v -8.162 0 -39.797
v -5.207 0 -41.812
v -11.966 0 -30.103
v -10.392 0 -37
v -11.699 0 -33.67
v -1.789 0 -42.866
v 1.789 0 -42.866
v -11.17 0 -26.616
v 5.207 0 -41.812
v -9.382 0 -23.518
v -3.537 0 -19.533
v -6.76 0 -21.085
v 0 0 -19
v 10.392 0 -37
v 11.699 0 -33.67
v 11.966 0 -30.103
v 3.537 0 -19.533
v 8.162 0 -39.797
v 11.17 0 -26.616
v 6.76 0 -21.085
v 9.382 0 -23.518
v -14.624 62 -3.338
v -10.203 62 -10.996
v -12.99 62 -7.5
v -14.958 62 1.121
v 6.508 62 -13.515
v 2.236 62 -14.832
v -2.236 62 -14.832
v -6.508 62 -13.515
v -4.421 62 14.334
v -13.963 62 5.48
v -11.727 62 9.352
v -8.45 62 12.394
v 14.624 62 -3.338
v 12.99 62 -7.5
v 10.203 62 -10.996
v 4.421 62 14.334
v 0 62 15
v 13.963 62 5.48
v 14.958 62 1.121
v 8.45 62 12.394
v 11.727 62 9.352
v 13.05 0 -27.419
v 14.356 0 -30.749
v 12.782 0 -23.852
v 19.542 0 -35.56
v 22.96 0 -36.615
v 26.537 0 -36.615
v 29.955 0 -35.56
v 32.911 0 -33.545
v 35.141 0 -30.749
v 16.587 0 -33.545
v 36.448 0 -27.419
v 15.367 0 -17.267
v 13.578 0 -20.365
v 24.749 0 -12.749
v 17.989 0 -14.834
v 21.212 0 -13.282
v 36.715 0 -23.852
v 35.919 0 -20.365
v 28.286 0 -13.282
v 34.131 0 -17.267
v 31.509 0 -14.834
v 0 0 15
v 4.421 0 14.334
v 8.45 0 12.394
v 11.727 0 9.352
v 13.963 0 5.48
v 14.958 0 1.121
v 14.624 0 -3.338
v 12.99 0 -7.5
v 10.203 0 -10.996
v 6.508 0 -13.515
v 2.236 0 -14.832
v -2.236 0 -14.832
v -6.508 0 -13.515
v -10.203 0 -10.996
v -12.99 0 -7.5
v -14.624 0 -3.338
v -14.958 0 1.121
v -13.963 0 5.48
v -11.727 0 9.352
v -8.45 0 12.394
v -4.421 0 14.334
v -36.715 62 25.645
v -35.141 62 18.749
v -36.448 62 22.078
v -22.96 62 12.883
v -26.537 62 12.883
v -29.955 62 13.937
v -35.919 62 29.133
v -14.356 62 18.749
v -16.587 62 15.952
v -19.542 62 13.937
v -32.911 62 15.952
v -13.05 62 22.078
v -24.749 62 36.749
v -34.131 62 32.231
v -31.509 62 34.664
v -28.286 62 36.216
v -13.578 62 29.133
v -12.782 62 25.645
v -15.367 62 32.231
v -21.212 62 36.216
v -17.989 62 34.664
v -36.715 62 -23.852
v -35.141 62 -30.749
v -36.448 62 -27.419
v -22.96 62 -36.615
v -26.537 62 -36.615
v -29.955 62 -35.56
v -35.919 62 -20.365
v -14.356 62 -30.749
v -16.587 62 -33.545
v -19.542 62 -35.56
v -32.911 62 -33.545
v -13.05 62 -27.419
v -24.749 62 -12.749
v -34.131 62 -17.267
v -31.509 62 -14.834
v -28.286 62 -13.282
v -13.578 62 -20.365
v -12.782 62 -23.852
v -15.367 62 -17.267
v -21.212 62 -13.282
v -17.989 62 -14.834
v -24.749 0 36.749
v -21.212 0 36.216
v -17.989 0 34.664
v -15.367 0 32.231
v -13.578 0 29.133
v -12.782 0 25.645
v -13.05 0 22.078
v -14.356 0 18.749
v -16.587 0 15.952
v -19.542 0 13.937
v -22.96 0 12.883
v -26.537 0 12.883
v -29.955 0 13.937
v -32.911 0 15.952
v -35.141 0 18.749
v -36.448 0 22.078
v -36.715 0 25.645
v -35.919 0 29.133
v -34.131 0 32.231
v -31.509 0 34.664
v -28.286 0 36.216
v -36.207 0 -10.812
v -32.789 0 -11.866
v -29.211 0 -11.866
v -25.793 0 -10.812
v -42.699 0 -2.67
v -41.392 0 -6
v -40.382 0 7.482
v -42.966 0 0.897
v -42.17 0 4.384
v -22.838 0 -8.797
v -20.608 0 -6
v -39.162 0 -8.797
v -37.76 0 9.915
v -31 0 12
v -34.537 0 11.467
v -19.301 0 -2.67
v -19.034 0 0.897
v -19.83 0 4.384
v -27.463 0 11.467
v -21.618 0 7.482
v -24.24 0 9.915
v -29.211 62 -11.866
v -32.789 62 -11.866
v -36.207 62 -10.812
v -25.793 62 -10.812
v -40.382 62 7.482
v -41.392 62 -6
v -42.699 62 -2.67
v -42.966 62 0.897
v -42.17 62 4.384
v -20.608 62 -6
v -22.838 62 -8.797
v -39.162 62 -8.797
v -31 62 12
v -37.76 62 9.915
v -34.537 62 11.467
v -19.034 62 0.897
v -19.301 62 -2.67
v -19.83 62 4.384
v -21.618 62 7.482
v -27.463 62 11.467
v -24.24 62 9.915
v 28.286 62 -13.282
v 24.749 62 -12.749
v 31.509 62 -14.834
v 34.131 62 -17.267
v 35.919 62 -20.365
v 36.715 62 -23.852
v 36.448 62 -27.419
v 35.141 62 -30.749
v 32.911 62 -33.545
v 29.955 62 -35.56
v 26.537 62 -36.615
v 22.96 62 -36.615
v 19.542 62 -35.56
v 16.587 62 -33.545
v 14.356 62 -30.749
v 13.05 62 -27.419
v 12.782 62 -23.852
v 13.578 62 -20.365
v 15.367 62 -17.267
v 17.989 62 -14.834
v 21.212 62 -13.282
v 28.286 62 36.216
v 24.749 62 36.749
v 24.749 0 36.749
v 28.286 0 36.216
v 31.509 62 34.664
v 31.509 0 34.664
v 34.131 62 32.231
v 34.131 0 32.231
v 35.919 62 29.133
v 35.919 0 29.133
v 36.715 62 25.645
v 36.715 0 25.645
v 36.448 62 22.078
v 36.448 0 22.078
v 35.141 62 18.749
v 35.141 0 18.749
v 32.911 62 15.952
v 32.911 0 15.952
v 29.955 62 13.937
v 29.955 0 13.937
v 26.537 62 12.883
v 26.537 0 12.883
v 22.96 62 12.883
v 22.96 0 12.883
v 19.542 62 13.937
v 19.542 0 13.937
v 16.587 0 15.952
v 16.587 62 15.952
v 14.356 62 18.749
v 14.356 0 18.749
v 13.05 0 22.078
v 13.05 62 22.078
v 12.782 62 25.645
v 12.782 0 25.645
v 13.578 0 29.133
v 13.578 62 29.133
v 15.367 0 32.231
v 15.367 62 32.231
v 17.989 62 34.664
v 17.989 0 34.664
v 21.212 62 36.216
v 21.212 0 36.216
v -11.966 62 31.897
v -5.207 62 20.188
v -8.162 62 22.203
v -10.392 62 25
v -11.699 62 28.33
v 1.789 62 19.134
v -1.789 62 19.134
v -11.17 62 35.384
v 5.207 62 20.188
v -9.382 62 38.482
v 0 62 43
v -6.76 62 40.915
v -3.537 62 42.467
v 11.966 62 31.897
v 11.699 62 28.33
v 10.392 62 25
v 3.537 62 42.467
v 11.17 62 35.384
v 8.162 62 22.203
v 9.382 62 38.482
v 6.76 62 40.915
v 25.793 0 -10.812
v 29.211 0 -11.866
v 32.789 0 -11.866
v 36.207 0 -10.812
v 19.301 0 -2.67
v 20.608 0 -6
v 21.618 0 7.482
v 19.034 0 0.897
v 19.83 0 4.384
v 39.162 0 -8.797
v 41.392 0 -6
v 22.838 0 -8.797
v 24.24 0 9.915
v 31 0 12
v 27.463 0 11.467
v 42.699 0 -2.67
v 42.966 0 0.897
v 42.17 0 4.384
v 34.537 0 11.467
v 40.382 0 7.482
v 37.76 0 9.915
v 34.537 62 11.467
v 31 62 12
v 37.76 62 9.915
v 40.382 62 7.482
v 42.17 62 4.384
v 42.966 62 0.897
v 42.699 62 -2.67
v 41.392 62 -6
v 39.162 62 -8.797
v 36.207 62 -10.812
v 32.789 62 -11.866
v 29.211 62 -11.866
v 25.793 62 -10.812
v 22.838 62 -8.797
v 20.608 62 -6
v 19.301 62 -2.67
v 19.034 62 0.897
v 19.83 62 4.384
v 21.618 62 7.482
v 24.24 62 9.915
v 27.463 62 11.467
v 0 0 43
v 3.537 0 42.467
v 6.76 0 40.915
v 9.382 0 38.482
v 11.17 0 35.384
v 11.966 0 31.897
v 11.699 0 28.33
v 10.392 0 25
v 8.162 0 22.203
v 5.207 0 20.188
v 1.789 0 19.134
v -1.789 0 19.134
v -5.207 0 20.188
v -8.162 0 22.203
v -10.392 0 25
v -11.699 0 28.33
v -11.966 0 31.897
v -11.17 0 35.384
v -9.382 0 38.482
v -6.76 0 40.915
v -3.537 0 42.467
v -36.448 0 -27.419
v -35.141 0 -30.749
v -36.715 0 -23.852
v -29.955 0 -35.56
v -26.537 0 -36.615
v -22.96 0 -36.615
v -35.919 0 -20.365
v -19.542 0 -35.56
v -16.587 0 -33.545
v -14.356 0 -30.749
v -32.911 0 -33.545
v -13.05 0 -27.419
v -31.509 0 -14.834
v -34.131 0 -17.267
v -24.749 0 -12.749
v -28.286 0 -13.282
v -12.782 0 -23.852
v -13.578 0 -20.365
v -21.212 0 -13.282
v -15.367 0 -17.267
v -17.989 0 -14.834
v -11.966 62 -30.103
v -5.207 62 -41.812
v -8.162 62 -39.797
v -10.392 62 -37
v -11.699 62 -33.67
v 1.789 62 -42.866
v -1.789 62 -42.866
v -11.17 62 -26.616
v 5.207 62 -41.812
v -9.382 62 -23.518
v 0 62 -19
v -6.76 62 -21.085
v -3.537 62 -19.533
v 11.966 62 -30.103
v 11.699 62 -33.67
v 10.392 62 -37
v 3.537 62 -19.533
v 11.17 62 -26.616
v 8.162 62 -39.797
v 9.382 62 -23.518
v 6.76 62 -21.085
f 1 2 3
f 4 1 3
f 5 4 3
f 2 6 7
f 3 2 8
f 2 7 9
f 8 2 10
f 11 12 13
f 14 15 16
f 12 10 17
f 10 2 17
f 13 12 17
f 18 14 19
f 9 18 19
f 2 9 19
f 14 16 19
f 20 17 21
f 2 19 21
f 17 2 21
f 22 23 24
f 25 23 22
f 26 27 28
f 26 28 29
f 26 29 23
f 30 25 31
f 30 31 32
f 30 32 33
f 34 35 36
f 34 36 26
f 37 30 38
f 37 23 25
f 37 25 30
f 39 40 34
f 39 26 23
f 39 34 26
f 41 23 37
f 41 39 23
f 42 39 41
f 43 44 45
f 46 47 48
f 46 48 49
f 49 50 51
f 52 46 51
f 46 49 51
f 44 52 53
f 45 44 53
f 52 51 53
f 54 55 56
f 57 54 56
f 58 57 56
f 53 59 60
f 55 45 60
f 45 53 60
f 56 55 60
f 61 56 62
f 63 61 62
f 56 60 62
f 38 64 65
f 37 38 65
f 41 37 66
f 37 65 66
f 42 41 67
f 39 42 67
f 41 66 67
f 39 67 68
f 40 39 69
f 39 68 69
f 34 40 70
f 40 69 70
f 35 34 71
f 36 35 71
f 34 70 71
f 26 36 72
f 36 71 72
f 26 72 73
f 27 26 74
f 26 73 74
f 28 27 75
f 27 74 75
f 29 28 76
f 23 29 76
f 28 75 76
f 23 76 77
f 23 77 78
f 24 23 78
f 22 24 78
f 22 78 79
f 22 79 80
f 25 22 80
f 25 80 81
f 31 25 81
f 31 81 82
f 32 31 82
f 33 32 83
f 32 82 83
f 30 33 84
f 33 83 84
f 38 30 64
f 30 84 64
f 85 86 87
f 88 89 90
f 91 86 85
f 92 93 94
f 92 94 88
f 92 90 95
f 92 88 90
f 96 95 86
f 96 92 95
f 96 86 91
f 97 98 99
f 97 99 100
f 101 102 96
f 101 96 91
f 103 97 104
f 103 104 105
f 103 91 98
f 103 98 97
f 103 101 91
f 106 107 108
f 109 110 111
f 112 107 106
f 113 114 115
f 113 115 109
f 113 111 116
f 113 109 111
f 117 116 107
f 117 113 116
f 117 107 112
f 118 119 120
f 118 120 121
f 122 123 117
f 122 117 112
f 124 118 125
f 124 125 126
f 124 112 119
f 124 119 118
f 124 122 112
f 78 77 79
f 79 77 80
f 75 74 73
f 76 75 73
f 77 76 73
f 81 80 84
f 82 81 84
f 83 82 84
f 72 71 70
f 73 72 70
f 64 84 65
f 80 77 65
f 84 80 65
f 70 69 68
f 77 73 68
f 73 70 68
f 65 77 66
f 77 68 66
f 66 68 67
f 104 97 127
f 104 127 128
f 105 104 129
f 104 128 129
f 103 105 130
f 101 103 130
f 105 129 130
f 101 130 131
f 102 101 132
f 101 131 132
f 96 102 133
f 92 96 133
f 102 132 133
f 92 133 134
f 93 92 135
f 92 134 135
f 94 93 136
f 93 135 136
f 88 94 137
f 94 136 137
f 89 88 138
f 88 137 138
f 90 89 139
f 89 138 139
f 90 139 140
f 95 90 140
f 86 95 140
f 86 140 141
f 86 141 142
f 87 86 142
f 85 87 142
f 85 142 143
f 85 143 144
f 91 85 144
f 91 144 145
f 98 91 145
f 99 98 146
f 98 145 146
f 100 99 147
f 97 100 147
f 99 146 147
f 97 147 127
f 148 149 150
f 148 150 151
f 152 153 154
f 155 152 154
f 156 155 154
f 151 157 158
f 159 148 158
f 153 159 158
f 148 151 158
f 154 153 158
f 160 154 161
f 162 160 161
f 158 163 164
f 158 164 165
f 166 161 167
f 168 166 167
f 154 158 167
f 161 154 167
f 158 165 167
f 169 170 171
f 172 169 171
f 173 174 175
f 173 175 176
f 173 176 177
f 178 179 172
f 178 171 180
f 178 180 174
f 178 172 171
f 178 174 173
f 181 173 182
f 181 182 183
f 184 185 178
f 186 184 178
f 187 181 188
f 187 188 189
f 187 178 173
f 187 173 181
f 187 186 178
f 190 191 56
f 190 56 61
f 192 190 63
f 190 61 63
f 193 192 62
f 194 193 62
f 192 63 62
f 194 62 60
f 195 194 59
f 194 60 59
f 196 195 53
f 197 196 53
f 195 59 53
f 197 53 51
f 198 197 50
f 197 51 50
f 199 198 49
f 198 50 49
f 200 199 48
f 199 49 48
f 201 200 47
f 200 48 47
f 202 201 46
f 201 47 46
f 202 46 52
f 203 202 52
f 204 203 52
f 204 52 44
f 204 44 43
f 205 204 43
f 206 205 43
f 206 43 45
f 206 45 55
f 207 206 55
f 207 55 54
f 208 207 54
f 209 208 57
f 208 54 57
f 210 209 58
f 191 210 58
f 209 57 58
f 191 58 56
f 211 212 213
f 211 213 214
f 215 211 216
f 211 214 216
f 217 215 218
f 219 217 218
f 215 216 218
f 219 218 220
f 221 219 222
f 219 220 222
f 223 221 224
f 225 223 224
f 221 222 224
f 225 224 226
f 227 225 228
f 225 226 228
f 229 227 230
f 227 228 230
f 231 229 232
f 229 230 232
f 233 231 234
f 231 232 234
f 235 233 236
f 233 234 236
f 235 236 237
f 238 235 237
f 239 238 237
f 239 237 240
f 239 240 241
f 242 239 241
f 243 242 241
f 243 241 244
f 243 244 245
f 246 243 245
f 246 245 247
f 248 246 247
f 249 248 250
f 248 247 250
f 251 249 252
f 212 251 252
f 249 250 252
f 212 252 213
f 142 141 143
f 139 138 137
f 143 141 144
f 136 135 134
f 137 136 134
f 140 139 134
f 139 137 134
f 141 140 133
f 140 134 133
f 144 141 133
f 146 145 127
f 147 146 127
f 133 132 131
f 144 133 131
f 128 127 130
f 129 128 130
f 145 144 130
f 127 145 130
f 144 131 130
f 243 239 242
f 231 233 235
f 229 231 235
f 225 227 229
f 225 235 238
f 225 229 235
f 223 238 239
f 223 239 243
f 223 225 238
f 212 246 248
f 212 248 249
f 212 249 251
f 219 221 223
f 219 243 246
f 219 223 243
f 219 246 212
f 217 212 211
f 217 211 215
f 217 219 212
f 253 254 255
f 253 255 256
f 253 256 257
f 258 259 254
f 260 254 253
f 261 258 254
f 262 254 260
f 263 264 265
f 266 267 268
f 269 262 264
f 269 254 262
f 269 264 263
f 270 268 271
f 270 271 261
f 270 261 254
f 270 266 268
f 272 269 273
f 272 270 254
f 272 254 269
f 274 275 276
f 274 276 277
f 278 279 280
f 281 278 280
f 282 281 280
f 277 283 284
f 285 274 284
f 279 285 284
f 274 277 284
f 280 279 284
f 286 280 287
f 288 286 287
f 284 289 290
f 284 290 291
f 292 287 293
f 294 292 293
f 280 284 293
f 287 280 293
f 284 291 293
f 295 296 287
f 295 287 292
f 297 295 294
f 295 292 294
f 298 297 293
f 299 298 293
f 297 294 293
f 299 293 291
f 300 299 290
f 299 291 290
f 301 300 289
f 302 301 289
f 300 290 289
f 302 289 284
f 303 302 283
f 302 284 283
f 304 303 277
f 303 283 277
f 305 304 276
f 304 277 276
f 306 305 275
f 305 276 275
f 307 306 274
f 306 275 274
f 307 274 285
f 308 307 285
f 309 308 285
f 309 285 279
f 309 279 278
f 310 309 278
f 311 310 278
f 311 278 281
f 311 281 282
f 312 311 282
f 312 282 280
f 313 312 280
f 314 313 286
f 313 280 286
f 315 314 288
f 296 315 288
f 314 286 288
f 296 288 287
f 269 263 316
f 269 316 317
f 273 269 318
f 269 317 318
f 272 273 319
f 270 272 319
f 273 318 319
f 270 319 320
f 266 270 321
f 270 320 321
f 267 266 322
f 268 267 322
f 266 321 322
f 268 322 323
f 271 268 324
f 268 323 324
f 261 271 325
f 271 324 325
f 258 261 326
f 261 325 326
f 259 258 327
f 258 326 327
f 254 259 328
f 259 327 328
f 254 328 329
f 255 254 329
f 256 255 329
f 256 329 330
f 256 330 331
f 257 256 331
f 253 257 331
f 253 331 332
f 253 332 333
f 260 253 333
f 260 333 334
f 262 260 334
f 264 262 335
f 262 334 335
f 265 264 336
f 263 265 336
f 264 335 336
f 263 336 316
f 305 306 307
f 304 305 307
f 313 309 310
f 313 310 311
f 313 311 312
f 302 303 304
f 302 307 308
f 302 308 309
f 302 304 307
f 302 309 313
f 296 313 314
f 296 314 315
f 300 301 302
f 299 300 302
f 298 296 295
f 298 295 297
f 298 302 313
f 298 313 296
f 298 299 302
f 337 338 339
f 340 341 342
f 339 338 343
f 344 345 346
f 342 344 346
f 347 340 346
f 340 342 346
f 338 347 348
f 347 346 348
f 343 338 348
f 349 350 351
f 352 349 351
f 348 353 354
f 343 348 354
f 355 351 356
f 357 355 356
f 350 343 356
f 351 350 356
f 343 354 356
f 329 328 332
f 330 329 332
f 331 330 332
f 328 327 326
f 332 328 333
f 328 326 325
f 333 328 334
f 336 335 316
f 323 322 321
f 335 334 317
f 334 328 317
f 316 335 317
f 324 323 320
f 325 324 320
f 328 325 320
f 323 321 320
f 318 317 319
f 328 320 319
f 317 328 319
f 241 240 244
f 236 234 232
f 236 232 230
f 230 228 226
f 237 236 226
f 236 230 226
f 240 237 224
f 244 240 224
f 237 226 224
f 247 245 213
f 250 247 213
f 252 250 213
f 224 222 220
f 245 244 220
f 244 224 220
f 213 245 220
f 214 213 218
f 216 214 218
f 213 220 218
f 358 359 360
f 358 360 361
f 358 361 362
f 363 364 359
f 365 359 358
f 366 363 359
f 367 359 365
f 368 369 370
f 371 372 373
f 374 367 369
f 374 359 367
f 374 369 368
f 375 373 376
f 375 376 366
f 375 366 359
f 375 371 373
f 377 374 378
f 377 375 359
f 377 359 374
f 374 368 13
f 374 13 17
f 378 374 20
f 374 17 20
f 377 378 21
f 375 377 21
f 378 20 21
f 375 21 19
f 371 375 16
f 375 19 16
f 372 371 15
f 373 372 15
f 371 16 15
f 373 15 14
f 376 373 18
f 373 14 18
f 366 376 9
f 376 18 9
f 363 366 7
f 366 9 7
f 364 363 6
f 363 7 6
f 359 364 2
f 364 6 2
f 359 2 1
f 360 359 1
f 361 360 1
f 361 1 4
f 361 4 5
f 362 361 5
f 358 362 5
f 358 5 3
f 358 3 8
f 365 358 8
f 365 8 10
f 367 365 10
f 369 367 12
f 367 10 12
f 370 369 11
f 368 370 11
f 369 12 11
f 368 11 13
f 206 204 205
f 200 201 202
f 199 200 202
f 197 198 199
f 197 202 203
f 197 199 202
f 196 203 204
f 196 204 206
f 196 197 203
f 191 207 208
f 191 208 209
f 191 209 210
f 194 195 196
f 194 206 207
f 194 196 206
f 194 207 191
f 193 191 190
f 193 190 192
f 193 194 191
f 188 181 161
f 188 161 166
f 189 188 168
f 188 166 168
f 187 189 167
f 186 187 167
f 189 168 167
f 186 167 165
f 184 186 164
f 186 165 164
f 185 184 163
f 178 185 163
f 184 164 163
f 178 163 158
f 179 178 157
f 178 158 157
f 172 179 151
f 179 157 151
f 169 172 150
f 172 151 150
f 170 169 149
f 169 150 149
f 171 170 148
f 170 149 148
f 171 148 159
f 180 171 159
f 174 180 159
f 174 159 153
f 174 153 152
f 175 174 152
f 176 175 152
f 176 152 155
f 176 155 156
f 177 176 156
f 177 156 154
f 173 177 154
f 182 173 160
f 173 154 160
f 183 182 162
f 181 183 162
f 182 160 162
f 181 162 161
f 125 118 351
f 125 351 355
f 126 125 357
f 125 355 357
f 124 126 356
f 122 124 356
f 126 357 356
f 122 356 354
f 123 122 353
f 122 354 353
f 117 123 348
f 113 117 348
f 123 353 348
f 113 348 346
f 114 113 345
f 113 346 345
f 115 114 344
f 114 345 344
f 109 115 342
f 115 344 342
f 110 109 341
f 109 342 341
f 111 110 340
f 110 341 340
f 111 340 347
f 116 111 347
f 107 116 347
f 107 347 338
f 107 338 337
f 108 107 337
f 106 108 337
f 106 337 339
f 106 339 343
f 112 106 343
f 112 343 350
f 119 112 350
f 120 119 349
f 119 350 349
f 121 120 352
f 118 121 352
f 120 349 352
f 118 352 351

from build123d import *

# Parameters (mm, degrees)
SKETCH_2_R        = 15
EXTRUDE_2_DEPTH   = 62
SKETCH_2_R_2      = 12
EXTRUDE_2_2_DEPTH = 62
EXTRUDE_2_3_DEPTH = 62
EXTRUDE_2_4_DEPTH = 62
EXTRUDE_2_5_DEPTH = 62
EXTRUDE_2_6_DEPTH = 62
EXTRUDE_2_7_DEPTH = 62
EXTRUDE_2_8_DEPTH = 62
EXTRUDE_2_9_DEPTH = 62


with BuildPart() as part:
    # 草图2 → 凸台-拉伸2 (new body)
    with BuildSketch(Plane(origin=(0, 0, 0), x_dir=(1, 0, 0), z_dir=(0, 1, 0))):
        with Locations(Location((0, 0, 0), (0, 0, 270))):
            Circle(SKETCH_2_R)
    extrude(amount=EXTRUDE_2_DEPTH)


with BuildPart() as body_2:
    # 草图2 → Extrude 2 2 (new body)
    with BuildSketch(Plane(origin=(0, 0, 0), x_dir=(1, 0, 0), z_dir=(0, 1, 0))):
        with Locations(Location((31, 0, 0), (0, 0, 270))):
            Circle(SKETCH_2_R_2)
    extrude(amount=EXTRUDE_2_2_DEPTH)


with BuildPart() as body_3:
    # 草图2 → Extrude 2 3 (new body)
    with BuildSketch(Plane(origin=(0, 0, 0), x_dir=(1, 0, 0), z_dir=(0, 1, 0))):
        with Locations(Location((0, -31, 0), (0, 0, 270))):
            Circle(SKETCH_2_R_2)
    extrude(amount=EXTRUDE_2_3_DEPTH)


with BuildPart() as body_4:
    # 草图2 → Extrude 2 4 (new body)
    with BuildSketch(Plane(origin=(0, 0, 0), x_dir=(1, 0, 0), z_dir=(0, 1, 0))):
        with Locations(Location((-31, 0, 0), (0, 0, 270))):
            Circle(SKETCH_2_R_2)
    extrude(amount=EXTRUDE_2_4_DEPTH)


with BuildPart() as body_5:
    # 草图2 → Extrude 2 5 (new body)
    with BuildSketch(Plane(origin=(0, 0, 0), x_dir=(1, 0, 0), z_dir=(0, 1, 0))):
        with Locations(Location((0, 31, 0), (0, 0, 270))):
            Circle(SKETCH_2_R_2)
    extrude(amount=EXTRUDE_2_5_DEPTH)


with BuildPart() as body_6:
    # 草图2 → Extrude 2 6 (new body)
    with BuildSketch(Plane(origin=(0, 0, 0), x_dir=(1, 0, 0), z_dir=(0, 1, 0))):
        with Locations(Location((24.748737342, -24.748737342, 0), (0, 0, 270))):
            Circle(SKETCH_2_R_2)
    extrude(amount=EXTRUDE_2_6_DEPTH)


with BuildPart() as body_7:
    # 草图2 → Extrude 2 7 (new body)
    with BuildSketch(Plane(origin=(0, 0, 0), x_dir=(1, 0, 0), z_dir=(0, 1, 0))):
        with Locations(Location((-24.748737342, -24.748737342, 0), (0, 0, 270))):
            Circle(SKETCH_2_R_2)
    extrude(amount=EXTRUDE_2_7_DEPTH)


with BuildPart() as body_8:
    # 草图2 → Extrude 2 8 (new body)
    with BuildSketch(Plane(origin=(0, 0, 0), x_dir=(1, 0, 0), z_dir=(0, 1, 0))):
        with Locations(Location((-24.748737342, 24.748737342, 0), (0, 0, 270))):
            Circle(SKETCH_2_R_2)
    extrude(amount=EXTRUDE_2_8_DEPTH)


with BuildPart() as body_9:
    # 草图2 → Extrude 2 9 (new body)
    with BuildSketch(Plane(origin=(0, 0, 0), x_dir=(1, 0, 0), z_dir=(0, 1, 0))):
        with Locations(Location((24.748737342, 24.748737342, 0), (0, 0, 270))):
            Circle(SKETCH_2_R_2)
    extrude(amount=EXTRUDE_2_9_DEPTH)


solid = Compound([part.part, body_2.part, body_3.part, body_4.part, body_5.part, body_6.part, body_7.part, body_8.part, body_9.part])
